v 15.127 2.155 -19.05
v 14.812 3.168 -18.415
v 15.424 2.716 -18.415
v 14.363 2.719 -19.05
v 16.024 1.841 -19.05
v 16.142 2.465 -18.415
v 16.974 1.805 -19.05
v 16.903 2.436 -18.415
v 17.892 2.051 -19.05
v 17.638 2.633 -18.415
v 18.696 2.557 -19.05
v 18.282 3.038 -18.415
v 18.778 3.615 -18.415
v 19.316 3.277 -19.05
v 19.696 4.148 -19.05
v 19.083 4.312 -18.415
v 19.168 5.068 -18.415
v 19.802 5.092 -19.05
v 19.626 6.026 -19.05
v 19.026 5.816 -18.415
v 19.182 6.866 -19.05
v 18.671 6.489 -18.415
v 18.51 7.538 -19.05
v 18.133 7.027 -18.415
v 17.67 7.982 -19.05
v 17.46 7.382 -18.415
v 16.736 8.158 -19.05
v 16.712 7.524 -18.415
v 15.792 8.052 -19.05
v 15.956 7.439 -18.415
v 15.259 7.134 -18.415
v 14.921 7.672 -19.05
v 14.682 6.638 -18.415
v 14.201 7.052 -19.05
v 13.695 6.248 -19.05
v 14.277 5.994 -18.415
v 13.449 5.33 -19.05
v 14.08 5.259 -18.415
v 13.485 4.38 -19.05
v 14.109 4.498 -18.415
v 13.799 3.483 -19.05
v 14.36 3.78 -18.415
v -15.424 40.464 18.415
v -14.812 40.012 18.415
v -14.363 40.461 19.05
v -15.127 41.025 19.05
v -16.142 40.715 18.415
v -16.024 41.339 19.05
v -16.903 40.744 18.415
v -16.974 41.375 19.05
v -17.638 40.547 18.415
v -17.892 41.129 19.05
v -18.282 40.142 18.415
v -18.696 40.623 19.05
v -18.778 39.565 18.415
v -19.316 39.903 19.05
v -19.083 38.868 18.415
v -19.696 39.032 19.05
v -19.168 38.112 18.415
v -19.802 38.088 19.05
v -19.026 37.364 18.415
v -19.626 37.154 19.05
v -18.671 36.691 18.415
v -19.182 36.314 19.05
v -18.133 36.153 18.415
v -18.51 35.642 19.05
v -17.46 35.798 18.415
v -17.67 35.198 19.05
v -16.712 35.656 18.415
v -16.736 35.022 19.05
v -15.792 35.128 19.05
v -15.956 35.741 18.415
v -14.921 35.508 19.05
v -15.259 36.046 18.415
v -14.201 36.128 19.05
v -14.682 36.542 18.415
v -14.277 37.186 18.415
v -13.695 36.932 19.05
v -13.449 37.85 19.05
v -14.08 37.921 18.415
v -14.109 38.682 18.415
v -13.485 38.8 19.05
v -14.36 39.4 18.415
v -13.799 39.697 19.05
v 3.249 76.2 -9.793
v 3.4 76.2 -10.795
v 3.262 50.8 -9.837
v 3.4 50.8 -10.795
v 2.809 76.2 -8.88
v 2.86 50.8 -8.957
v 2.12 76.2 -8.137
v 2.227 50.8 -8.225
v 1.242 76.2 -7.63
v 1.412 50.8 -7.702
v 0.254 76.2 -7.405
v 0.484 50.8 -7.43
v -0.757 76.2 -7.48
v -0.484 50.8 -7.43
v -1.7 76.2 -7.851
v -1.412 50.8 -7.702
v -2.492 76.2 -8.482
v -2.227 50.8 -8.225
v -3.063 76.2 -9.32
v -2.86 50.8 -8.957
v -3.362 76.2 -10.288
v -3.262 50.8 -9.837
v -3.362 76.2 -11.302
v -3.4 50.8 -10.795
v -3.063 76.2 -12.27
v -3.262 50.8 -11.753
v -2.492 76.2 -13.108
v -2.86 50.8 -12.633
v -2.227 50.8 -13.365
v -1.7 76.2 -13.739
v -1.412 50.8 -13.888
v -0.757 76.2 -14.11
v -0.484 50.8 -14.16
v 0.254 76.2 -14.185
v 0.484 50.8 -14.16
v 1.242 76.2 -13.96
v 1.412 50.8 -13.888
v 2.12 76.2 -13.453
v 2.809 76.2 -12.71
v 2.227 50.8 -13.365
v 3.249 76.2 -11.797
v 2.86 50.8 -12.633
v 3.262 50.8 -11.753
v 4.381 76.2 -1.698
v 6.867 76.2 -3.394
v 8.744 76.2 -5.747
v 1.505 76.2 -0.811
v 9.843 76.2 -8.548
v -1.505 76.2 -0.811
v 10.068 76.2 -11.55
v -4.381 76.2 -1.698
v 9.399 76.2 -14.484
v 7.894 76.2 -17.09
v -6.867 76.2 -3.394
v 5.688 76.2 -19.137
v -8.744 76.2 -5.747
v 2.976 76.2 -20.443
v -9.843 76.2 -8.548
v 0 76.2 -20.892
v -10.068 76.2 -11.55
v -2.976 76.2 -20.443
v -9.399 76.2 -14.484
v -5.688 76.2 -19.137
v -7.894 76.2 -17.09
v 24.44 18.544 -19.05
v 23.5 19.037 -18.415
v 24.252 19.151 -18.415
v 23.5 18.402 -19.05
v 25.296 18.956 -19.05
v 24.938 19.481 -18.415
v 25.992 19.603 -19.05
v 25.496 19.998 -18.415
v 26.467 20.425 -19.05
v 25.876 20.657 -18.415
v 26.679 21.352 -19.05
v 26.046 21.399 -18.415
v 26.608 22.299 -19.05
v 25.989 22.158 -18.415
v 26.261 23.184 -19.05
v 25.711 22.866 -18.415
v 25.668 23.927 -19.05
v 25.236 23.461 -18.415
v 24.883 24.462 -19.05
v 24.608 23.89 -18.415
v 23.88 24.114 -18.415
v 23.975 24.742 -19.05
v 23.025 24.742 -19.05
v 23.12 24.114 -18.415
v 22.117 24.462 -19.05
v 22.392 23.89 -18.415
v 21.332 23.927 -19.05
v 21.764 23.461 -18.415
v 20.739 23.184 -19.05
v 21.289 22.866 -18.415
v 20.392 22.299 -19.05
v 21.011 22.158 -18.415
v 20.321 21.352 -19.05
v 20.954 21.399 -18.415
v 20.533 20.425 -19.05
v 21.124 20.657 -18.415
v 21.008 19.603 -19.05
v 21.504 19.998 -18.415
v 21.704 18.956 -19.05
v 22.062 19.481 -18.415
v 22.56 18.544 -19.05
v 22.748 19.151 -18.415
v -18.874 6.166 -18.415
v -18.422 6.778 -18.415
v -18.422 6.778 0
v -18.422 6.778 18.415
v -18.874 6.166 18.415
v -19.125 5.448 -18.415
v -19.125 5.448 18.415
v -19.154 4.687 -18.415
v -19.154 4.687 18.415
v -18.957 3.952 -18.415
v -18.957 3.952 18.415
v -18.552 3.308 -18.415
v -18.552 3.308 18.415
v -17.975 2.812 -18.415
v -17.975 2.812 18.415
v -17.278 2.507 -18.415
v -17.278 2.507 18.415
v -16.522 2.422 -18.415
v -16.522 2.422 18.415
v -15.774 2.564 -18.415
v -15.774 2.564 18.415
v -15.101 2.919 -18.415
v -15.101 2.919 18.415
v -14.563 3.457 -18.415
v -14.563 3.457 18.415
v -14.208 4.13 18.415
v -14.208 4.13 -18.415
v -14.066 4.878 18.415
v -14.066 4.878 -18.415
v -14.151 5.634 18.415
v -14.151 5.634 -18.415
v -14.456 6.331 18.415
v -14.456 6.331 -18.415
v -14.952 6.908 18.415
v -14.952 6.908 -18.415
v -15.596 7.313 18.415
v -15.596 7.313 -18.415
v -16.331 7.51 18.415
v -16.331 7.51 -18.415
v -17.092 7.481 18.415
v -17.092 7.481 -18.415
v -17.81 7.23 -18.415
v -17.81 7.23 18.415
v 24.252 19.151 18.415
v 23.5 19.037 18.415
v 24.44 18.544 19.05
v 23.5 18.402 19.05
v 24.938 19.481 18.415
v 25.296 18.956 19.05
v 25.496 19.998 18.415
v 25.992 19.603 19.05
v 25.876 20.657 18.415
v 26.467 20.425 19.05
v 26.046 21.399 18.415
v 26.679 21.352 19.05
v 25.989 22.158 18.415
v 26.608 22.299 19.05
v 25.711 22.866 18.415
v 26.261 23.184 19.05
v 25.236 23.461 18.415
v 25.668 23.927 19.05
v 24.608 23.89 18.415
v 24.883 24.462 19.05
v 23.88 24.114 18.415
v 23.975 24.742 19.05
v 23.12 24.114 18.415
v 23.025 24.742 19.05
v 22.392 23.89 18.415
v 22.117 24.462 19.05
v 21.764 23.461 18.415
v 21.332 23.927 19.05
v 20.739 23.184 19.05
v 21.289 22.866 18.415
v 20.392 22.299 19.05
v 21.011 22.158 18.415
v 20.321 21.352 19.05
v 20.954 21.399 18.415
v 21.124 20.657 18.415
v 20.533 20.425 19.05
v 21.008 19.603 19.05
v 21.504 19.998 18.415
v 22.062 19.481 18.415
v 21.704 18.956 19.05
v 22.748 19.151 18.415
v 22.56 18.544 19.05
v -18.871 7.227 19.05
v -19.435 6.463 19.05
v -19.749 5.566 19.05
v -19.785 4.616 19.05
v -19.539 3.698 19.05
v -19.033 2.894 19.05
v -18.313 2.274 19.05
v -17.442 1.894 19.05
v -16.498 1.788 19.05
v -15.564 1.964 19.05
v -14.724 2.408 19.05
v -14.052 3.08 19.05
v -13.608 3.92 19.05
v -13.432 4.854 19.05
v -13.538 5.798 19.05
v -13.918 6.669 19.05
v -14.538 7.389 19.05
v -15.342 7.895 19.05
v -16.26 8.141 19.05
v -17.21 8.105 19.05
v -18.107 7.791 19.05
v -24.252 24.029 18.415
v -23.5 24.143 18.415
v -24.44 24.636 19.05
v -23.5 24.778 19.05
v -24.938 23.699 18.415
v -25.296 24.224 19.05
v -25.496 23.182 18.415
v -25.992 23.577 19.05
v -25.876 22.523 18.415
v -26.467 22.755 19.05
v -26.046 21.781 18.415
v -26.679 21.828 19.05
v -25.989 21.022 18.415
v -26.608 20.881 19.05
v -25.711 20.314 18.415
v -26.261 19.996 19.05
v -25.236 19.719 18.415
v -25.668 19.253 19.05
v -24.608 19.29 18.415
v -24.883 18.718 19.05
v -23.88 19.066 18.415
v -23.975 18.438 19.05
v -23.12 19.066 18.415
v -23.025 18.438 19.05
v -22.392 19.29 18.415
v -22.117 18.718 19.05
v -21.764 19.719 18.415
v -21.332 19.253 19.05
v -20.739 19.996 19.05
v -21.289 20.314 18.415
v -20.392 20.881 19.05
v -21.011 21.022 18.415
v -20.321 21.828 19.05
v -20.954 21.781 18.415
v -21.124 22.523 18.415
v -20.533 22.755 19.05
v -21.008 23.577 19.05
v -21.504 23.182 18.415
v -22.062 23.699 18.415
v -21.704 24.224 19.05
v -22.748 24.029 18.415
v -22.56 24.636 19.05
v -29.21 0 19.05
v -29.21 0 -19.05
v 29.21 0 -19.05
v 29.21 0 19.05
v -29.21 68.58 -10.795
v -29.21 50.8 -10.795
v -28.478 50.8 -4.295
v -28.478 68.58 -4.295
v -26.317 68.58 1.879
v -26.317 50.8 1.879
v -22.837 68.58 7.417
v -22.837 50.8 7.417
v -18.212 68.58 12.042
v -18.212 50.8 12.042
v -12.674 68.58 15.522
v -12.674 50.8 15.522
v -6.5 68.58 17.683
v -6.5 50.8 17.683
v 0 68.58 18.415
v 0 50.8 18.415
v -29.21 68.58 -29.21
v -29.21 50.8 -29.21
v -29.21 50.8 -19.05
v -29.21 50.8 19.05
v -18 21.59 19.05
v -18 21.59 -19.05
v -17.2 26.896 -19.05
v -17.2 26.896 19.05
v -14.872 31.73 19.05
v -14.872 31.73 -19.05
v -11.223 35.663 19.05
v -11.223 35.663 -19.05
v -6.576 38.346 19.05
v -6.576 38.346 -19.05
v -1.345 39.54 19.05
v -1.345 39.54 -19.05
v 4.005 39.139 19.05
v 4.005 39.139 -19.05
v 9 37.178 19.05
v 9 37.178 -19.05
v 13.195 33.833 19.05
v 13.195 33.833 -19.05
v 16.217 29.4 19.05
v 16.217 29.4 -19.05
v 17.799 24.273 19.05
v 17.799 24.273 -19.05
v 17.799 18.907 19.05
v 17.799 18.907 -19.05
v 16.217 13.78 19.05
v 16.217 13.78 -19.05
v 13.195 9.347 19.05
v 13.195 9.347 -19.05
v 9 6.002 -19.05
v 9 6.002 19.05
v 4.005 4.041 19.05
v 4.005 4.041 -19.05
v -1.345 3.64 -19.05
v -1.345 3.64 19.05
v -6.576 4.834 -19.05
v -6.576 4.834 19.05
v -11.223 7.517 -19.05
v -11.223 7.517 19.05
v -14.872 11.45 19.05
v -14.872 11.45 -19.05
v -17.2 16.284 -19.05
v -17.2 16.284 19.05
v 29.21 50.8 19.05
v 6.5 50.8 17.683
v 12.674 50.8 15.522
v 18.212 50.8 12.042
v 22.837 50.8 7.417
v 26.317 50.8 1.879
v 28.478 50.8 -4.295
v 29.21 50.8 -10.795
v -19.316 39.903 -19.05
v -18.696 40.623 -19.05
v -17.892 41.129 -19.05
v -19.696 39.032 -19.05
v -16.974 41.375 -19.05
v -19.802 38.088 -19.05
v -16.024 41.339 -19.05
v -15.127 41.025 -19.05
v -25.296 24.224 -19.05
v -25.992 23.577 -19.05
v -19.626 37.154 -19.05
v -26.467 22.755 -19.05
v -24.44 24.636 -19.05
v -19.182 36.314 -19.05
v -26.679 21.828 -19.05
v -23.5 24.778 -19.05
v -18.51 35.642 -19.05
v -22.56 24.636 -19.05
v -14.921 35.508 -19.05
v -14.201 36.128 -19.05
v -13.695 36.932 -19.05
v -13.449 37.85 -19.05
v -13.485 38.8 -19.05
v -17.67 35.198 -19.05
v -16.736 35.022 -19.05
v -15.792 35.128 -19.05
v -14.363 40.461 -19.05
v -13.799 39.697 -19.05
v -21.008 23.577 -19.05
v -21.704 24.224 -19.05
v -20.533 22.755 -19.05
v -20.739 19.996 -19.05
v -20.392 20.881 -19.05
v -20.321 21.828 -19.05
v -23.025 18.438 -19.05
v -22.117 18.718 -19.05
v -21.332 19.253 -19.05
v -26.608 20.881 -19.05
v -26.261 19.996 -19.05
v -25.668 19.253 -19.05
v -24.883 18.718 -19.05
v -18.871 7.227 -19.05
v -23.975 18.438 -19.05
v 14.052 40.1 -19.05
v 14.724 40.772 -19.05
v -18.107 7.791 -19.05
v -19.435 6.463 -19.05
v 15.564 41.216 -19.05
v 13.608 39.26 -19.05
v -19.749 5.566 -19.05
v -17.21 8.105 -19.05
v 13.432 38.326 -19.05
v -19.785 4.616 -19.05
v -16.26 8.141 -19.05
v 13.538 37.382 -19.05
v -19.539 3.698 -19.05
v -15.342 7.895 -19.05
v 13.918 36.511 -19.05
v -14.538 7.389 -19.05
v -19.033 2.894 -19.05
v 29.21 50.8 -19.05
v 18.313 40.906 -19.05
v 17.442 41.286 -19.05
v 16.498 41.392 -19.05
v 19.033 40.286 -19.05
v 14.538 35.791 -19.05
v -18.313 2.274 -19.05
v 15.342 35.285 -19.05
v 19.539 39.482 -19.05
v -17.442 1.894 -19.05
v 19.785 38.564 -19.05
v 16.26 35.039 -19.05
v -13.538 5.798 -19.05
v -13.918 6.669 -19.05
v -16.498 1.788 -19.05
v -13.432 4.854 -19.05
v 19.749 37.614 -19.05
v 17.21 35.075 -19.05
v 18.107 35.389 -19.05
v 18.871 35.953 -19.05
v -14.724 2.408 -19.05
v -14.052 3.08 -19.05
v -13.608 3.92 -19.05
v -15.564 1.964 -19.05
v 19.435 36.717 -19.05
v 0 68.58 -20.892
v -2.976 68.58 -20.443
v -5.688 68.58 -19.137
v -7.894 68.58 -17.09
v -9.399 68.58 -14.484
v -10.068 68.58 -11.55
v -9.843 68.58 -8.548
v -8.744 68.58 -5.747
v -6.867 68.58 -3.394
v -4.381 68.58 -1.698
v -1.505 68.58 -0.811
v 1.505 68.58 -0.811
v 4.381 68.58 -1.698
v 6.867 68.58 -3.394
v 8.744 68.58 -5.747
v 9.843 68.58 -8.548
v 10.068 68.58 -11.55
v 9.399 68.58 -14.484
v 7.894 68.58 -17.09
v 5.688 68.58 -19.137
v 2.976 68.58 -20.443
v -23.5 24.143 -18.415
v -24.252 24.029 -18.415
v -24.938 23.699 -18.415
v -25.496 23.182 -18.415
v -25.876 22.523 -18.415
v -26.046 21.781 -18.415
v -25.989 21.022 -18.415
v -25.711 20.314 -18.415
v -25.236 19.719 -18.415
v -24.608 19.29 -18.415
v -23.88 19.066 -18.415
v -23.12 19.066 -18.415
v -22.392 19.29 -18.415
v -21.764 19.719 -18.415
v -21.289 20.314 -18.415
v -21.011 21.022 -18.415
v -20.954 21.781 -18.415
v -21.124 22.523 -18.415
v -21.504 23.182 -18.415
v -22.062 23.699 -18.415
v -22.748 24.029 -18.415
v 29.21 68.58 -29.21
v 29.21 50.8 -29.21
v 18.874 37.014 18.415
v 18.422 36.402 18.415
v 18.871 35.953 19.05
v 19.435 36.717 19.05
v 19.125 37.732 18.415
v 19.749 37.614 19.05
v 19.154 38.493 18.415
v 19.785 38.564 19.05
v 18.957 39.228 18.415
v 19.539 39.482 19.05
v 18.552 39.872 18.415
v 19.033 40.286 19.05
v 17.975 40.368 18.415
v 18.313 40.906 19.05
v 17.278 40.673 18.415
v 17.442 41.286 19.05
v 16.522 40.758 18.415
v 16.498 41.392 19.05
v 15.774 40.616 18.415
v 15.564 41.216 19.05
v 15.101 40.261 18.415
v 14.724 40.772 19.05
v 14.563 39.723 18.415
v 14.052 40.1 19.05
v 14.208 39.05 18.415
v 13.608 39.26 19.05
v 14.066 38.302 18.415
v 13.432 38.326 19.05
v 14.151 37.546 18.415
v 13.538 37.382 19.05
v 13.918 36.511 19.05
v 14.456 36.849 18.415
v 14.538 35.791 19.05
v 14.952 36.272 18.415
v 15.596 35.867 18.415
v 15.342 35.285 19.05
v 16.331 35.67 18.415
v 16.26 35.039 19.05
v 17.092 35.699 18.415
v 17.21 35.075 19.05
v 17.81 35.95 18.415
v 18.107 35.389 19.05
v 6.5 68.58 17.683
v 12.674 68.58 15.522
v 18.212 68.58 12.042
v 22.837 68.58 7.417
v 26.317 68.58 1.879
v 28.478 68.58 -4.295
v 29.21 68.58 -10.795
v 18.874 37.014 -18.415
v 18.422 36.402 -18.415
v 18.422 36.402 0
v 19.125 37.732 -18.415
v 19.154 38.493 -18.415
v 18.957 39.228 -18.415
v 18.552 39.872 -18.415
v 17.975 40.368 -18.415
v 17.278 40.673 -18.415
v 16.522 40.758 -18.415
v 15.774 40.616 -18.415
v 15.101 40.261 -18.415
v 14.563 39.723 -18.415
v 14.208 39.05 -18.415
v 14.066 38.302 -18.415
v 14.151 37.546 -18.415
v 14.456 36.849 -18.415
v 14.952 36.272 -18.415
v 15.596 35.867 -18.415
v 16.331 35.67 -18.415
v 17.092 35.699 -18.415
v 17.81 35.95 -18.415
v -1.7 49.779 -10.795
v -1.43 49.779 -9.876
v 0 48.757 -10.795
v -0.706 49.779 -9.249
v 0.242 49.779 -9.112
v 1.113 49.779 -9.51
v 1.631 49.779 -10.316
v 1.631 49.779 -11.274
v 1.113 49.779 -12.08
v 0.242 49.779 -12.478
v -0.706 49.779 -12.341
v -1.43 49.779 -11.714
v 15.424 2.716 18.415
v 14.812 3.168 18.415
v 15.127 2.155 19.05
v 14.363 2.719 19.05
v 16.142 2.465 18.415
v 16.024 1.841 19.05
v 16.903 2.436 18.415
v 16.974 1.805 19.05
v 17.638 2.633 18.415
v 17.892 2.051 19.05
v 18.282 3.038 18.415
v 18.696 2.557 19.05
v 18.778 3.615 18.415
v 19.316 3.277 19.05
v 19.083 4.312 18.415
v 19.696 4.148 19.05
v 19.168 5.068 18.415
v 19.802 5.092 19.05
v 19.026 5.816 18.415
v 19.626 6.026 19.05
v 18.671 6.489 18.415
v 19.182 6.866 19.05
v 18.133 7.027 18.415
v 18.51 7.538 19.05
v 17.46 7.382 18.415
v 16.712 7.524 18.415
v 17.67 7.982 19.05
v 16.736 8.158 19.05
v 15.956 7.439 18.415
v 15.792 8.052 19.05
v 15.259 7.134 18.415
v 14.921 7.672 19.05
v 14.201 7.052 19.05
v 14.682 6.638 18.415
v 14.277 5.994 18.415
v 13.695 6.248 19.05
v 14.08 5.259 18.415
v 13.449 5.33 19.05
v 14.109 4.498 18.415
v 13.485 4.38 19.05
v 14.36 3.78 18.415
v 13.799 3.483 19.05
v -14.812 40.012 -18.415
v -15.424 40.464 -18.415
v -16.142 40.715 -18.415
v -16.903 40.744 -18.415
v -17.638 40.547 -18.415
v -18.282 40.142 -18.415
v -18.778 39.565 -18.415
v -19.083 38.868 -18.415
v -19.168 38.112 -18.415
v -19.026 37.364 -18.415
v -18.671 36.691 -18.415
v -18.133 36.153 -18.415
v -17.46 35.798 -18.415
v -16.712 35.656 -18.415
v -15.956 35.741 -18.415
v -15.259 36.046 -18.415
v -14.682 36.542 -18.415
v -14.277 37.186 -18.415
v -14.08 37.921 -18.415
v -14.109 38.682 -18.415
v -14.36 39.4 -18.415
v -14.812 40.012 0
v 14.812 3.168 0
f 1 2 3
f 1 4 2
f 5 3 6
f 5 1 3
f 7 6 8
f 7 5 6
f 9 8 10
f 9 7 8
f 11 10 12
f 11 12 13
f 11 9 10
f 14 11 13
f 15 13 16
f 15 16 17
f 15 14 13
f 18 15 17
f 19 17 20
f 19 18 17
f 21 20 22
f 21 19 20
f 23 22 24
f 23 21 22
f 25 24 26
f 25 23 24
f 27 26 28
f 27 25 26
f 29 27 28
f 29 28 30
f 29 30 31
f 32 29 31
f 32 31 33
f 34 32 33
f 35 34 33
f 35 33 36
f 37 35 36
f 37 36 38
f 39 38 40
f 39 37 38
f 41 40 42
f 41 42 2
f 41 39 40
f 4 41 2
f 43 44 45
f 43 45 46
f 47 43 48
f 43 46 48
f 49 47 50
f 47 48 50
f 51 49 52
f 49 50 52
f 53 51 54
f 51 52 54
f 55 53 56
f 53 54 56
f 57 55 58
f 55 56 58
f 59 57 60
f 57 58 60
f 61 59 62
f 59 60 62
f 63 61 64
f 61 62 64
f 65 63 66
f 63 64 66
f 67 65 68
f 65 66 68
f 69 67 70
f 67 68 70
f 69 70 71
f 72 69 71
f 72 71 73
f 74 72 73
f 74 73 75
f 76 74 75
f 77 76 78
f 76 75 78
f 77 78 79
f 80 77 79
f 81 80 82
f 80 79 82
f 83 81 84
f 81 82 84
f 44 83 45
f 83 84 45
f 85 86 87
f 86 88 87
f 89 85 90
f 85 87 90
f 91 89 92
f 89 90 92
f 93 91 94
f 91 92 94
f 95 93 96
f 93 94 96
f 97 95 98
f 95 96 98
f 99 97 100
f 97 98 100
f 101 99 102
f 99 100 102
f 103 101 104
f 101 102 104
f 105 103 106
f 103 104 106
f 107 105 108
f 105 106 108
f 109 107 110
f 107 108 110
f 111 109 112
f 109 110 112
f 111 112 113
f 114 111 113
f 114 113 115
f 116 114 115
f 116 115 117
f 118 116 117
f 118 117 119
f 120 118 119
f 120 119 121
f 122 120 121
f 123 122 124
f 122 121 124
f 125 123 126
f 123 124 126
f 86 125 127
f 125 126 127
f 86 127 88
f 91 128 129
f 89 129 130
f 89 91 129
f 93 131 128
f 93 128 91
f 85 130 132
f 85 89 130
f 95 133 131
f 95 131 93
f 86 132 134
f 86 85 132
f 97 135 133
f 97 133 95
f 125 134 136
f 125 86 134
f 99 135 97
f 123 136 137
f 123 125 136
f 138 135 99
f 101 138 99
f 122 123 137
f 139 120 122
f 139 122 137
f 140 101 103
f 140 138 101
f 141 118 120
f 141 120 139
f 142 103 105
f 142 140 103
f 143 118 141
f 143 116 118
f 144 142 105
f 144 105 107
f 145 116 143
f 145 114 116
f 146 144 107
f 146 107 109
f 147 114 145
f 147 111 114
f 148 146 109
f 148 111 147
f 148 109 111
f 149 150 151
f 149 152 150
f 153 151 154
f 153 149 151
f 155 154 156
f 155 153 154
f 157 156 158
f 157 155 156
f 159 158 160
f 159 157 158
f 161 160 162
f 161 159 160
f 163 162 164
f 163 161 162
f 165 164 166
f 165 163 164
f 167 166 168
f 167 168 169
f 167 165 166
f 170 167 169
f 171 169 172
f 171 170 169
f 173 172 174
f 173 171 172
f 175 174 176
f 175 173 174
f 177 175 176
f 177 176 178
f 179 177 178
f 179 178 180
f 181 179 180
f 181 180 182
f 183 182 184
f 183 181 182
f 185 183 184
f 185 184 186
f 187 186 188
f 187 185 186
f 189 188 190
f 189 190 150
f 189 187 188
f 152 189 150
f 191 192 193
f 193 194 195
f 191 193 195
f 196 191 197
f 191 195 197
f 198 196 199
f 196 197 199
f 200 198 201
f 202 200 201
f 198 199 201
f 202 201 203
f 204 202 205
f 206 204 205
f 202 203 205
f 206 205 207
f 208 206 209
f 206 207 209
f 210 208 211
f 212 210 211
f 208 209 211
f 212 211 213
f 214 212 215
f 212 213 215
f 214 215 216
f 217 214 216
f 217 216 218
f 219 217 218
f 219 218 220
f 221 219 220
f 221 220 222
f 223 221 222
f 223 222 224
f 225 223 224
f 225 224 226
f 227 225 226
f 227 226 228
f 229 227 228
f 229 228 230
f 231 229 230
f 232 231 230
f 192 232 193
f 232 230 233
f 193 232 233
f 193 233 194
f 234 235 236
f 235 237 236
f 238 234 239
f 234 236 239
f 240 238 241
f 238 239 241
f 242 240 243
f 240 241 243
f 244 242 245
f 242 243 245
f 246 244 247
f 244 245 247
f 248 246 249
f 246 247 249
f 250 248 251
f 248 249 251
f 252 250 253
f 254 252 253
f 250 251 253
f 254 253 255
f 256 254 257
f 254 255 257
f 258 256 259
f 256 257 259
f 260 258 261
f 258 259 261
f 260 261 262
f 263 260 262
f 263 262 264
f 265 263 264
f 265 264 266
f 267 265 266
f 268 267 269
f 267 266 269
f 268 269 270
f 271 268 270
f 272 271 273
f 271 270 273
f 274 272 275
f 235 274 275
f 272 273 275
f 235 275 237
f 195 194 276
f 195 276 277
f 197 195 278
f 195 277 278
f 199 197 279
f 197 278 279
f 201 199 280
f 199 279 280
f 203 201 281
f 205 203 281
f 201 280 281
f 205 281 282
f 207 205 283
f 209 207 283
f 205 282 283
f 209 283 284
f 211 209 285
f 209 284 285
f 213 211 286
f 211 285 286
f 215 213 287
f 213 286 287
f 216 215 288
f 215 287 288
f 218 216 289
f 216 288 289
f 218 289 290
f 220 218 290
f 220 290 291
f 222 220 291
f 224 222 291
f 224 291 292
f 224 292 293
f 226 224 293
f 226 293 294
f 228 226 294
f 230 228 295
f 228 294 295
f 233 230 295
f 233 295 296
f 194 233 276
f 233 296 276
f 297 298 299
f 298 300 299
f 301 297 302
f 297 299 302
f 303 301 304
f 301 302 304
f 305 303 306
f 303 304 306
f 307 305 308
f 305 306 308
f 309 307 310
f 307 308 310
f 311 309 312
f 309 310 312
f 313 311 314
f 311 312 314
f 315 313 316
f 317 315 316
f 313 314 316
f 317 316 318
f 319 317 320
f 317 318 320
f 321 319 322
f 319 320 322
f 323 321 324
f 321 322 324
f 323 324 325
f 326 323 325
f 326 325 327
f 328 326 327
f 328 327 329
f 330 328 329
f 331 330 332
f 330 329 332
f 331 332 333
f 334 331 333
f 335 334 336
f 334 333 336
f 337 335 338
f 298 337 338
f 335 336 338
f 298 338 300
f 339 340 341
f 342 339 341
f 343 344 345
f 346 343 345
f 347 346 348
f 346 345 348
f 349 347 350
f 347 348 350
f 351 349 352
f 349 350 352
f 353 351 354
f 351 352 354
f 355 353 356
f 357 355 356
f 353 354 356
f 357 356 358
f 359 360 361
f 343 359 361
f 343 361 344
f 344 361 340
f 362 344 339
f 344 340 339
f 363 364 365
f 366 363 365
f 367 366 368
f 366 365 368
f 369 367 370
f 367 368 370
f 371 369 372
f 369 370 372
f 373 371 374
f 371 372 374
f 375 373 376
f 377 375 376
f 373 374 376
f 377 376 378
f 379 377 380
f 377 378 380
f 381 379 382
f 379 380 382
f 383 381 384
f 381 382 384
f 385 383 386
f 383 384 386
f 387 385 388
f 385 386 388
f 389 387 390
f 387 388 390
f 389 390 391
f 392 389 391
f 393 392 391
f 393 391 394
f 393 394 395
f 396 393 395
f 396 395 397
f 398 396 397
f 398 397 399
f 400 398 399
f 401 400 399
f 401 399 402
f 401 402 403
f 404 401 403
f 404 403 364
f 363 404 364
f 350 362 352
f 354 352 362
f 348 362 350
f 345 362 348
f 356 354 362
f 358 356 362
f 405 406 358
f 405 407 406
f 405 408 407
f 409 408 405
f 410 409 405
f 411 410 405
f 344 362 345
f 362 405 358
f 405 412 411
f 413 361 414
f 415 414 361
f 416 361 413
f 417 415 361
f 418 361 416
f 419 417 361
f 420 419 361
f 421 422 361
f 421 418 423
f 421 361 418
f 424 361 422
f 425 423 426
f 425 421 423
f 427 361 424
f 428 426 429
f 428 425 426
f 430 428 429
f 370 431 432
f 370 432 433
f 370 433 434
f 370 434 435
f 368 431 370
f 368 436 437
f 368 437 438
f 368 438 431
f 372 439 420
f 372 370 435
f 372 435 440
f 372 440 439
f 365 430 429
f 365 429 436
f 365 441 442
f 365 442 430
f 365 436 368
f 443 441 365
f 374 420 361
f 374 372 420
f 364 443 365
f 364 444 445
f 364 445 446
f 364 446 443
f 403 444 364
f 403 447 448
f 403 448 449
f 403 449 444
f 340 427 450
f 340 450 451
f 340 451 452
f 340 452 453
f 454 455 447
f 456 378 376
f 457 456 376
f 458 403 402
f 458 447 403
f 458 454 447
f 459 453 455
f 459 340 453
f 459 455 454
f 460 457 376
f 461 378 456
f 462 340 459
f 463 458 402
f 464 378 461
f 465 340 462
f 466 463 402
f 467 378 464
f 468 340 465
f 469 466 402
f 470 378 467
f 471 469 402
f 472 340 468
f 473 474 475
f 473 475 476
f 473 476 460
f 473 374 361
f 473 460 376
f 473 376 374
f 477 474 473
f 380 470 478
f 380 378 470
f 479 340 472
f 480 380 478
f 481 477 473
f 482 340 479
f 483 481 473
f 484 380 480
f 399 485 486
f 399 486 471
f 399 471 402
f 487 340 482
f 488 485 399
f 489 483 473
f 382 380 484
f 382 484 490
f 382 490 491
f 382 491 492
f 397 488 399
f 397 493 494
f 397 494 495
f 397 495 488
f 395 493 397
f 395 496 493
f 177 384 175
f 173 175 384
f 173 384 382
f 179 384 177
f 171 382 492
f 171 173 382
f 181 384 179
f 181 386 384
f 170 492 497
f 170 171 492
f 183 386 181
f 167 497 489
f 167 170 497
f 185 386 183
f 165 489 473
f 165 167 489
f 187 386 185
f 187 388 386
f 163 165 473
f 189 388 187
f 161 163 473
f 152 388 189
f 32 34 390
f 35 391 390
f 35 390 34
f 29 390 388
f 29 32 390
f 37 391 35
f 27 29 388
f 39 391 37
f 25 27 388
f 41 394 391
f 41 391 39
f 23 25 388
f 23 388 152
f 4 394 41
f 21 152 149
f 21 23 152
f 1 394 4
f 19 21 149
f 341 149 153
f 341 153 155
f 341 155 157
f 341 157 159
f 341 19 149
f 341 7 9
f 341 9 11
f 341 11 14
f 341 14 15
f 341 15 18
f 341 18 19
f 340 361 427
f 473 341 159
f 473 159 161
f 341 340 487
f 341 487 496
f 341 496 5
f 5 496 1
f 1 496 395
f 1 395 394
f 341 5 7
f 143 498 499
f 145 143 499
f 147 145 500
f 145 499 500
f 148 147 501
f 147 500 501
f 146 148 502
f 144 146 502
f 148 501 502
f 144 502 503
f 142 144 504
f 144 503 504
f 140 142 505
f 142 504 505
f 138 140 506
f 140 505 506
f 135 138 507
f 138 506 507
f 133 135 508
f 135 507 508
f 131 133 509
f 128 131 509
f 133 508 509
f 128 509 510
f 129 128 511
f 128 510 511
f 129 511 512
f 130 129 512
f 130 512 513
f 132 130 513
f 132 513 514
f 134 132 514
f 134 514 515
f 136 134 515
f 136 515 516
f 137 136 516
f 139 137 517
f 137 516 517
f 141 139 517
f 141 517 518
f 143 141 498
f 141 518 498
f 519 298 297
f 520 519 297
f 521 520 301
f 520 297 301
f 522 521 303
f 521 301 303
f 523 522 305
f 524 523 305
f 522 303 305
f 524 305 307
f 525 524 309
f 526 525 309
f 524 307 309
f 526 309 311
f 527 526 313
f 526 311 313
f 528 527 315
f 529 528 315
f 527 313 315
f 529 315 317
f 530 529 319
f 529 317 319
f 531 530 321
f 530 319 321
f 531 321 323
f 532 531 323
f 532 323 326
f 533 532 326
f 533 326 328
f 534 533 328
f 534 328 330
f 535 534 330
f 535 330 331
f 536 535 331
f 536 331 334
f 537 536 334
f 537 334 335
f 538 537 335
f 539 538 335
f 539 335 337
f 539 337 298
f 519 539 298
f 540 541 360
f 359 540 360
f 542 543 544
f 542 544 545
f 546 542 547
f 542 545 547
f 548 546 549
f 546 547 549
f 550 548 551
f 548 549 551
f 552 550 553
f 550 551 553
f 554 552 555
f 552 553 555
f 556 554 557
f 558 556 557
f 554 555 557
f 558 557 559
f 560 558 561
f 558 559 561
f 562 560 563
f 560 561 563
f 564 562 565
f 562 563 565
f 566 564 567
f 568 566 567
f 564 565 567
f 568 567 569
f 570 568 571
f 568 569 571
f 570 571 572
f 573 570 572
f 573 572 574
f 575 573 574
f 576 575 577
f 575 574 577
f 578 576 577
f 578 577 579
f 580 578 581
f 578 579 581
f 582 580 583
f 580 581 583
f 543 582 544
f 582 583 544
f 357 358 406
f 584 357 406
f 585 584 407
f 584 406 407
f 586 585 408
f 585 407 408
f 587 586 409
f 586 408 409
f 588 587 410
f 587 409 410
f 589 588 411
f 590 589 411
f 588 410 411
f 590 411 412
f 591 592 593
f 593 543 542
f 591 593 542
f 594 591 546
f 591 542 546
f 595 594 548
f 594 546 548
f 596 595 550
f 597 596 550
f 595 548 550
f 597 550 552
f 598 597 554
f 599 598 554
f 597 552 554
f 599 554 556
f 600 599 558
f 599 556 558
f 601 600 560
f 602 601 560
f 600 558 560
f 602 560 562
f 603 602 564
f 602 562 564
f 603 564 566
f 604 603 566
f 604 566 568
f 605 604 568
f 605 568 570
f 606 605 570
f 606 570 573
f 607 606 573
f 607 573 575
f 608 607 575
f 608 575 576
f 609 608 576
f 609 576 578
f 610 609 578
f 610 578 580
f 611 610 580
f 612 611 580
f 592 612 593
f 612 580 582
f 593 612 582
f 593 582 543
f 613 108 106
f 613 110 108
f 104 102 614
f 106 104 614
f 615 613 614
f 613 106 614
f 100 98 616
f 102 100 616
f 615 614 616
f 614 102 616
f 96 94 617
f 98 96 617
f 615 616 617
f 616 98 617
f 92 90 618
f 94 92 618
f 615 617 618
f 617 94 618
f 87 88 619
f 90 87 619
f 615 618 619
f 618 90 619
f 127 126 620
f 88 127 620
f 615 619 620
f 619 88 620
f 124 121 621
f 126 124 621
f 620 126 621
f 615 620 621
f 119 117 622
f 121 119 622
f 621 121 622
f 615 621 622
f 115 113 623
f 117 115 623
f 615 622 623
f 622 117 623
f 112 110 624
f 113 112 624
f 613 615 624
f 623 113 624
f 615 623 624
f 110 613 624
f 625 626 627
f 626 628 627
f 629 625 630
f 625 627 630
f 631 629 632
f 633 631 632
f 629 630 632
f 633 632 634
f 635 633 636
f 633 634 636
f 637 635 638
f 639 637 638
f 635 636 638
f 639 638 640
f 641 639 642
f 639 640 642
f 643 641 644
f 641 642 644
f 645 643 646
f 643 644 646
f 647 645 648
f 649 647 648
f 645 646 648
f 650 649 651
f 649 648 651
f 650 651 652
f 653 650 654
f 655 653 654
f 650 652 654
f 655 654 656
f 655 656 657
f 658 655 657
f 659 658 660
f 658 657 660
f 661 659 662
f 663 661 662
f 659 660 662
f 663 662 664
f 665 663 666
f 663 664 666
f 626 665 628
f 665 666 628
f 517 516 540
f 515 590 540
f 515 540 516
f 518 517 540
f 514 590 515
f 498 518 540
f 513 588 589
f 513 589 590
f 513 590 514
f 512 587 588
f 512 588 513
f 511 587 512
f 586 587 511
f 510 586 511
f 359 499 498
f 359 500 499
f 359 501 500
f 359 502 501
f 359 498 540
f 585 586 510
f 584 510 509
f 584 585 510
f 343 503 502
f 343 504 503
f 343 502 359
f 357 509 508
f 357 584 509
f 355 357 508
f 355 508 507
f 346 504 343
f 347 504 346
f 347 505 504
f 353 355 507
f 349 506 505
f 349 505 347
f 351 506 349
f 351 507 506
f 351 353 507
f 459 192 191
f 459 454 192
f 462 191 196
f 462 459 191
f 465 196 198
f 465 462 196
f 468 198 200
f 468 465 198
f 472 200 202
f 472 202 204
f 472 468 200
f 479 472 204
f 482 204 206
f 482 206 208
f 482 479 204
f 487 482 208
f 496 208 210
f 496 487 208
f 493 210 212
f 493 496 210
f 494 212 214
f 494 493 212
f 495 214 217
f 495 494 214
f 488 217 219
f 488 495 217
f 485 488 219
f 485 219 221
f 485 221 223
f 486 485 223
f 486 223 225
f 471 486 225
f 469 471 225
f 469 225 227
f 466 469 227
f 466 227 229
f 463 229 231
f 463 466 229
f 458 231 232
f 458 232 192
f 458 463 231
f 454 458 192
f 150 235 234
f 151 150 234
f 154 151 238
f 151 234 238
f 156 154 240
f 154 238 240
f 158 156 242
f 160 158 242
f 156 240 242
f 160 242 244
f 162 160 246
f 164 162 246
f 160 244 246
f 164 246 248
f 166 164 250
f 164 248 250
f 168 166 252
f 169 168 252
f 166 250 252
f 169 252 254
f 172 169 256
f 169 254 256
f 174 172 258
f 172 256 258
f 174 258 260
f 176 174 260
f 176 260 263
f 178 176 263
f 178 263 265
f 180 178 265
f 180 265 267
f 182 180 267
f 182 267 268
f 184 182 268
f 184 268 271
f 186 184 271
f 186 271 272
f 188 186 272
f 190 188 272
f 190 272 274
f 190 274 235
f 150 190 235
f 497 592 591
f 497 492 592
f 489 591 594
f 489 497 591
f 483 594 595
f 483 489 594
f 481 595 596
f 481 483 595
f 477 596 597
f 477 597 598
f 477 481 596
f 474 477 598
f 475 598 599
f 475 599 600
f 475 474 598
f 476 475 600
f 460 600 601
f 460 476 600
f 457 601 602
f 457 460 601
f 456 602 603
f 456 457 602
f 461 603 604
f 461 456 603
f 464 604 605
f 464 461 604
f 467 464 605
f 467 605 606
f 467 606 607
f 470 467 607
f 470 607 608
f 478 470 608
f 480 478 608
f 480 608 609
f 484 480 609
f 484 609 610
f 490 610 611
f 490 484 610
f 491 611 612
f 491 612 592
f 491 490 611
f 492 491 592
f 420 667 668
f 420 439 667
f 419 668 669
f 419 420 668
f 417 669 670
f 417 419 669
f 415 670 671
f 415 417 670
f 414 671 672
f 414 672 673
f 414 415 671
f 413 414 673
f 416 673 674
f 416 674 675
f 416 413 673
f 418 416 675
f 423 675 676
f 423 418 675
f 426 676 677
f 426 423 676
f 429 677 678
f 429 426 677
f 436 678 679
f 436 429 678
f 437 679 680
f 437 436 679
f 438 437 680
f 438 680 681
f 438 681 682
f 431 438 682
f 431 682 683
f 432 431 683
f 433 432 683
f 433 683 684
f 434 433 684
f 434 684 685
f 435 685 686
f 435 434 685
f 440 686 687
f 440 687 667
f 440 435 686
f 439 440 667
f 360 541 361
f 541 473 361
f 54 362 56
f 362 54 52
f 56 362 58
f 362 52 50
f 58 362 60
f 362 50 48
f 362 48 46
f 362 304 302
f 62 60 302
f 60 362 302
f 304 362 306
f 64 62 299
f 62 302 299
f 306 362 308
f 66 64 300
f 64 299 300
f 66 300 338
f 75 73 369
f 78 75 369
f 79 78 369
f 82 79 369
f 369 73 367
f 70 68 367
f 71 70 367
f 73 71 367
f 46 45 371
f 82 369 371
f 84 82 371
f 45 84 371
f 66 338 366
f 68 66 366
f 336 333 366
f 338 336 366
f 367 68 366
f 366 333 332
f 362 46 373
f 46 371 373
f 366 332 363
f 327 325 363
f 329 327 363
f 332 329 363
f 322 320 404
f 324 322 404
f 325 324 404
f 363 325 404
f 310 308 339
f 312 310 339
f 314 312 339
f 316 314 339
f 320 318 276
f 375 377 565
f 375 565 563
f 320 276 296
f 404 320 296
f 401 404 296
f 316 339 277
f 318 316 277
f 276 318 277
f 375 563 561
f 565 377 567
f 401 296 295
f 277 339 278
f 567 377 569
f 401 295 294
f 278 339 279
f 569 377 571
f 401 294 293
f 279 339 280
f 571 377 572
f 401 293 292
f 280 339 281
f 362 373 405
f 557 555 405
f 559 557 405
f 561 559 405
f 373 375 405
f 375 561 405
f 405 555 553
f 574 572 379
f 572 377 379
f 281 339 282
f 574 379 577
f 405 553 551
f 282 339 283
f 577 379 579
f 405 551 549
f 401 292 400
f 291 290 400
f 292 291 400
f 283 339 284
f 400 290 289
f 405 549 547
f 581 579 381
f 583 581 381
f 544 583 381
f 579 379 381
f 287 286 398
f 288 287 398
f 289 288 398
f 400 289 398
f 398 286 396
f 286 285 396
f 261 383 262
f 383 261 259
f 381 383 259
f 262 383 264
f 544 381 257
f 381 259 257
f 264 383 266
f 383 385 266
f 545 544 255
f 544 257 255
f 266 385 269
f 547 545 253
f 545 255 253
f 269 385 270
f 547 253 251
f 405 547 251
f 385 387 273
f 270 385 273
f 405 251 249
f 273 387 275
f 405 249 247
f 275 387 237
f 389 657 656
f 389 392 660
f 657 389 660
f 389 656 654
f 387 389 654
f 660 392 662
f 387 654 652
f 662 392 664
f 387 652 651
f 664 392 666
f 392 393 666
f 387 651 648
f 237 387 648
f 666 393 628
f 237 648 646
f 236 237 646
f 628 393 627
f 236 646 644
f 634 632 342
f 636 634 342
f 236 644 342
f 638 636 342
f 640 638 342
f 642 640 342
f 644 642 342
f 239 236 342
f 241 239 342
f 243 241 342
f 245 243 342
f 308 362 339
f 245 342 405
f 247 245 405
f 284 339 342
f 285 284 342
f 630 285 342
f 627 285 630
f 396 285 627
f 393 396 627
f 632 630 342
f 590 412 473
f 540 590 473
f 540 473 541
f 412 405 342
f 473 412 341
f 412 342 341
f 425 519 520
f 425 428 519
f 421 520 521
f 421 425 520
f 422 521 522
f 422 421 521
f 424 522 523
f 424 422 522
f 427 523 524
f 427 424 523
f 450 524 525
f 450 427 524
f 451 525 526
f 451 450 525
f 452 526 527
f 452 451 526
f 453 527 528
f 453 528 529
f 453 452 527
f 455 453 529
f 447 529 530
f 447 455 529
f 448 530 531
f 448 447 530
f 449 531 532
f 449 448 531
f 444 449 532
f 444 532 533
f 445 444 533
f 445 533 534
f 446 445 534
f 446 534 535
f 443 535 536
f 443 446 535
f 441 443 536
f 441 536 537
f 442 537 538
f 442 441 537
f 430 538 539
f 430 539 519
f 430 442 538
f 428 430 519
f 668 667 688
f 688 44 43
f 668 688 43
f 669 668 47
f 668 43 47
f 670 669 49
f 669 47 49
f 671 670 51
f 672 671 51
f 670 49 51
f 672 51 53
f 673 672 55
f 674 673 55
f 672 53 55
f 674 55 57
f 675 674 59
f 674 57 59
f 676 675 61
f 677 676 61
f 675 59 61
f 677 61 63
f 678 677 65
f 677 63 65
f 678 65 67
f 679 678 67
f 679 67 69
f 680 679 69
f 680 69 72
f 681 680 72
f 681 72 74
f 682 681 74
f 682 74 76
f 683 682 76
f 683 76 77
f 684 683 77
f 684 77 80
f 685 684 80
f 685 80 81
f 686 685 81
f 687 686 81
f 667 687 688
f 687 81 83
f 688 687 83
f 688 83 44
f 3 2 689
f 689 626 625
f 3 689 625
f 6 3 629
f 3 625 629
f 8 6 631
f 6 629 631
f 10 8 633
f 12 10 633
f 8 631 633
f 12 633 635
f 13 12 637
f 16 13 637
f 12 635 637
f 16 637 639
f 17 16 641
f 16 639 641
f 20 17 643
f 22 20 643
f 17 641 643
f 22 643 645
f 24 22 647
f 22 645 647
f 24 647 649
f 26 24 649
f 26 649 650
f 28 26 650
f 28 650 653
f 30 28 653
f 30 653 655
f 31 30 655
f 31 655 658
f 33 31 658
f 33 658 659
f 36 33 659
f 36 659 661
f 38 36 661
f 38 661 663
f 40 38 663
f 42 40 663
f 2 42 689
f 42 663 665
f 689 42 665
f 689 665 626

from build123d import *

# Parameters (mm, degrees)
SKETCH1_W                  = 58.42
SKETCH1_H                  = 38.1
BOSS_EXTRUDE1_DEPTH        = 50.8
BOSS_EXTRUDE3_DEPTH        = 17.78
SKETCH3_R                  = 10.0965
BOSS_EXTRUDE4_DEPTH        = 7.62
SKETCH8_R                  = 18
CUT_EXTRUDE2_DEPTH         = 91.06261211
M8X1_25_TAPPED_HOLE1_D     = 6.8
M8X1_25_TAPPED_HOLE1_DEPTH = 25.4
M8X1_25_TAPPED_HOLE1_TIP   = 2.042926105
CIRPATTERN2_COUNT          = 8


with BuildPart() as part:
    # Sketch1 → Boss-Extrude1 (new body)
    with BuildSketch(Plane(origin=(0, 0, 0), x_dir=(1, 0, 0), z_dir=(0, 1, 0))):
        Rectangle(SKETCH1_W, SKETCH1_H)
    extrude(amount=BOSS_EXTRUDE1_DEPTH)

    # Sketch2 → Boss-Extrude3 (add)
    with BuildSketch(Plane(origin=(0, 50.8, 0), x_dir=(-1, 0, 0), z_dir=(0, 1, 0))):
        with BuildLine():
            Line((29.21, -29.21), (29.21, -10.795))
            ThreePointArc((29.21, -10.795), (20.654589078, 9.859589078), (0, 18.415))
            ThreePointArc((0, 18.415), (-20.654589078, 9.859589078), (-29.21, -10.795))
            Line((-29.21, -10.795), (-29.21, -29.21))
            Line((-29.21, -29.21), (29.21, -29.21))
        make_face()
    extrude(amount=BOSS_EXTRUDE3_DEPTH)

    # Sketch3 → Boss-Extrude4 (add)
    with BuildSketch(Plane(origin=(0, 68.58, 0), x_dir=(-1, 0, 0), z_dir=(0, 1, 0))):
        with Locations(Location((0, -10.795, 0), (0, 0, 270))):
            Circle(SKETCH3_R)
    extrude(amount=BOSS_EXTRUDE4_DEPTH)

    # Sketch8 → Cut-Extrude2 (cut, through all)
    with BuildSketch(Plane(origin=(0, 0, -19.05), x_dir=(-1, 0, 0), z_dir=(0, 0, -1))):
        with Locations((0, 21.59)):
            Circle(SKETCH8_R)
    extrude(amount=-CUT_EXTRUDE2_DEPTH, mode=Mode.SUBTRACT)

    # M8x1.25 Tapped Hole1
    with Locations(Plane(origin=(0, 76.2, 0), x_dir=(-1, 0, 0), z_dir=(0, 1, 0))):
        with Locations((0, -10.795)):
            Hole(M8X1_25_TAPPED_HOLE1_D / 2, depth=M8X1_25_TAPPED_HOLE1_DEPTH)
            with Locations((0, 0, -(M8X1_25_TAPPED_HOLE1_DEPTH + M8X1_25_TAPPED_HOLE1_TIP / 2))):  # 118° drill point
                Cone(0, M8X1_25_TAPPED_HOLE1_D / 2, M8X1_25_TAPPED_HOLE1_TIP, mode=Mode.SUBTRACT)

    # Sketch13 → 1/4-20 Tapped Hole1 (revolve, cut)
    with BuildSketch(Plane(origin=(-23.5, 21.59, -19.05), x_dir=(0, 1, 0), z_dir=(1, 0, 0))):
        Polygon((0, 0), (0, 20.583816902), (2.5527, 19.05), (2.5527, 0.635), (3.1877, 0), align=None)
    f_1_4_20_tapped_hole1 = revolve(axis=Axis((-23.5, 21.59, -25.4), (0, 0, 1)), mode=Mode.SUBTRACT)

    # CirPattern2: 1/4-20 Tapped Hole1 ×8 about axis, 2 skipped
    cirpattern2_axis = Axis((0, 21.59, 0), (0, 0, -1))
    add([f_1_4_20_tapped_hole1.rotate(cirpattern2_axis, i * 360 / CIRPATTERN2_COUNT) for i in range(1, CIRPATTERN2_COUNT) if i not in (2, 6)], mode=Mode.SUBTRACT)

    # Mirror2: 1/4-20 Tapped Hole1 across plane
    add(f_1_4_20_tapped_hole1.mirror(Plane.XY), mode=Mode.SUBTRACT)

    # Mirror2 copy 1 sketch → Mirror2 copy 1 (revolve, cut)
    with BuildSketch(Plane(origin=(-16.617009358, 38.207009358, 19.05), x_dir=(0.7071067811865475, 0.7071067811865476, 0), z_dir=(0.7071067811865476, -0.7071067811865475, 0))):
        Polygon((0, 0), (0, -20.583816902), (2.5527, -19.05), (2.5527, -0.635), (3.1877, 0), align=None)
    revolve(axis=Axis((-16.617009358, 38.207009358, 25.4), (0, 0, 1)), mode=Mode.SUBTRACT)

    # Mirror2 copy 2 sketch → Mirror2 copy 2 (revolve, cut)
    with BuildSketch(Plane(origin=(16.617009358, 38.207009358, 19.05), x_dir=(0.7071067811865476, -0.7071067811865475, 0), z_dir=(-0.7071067811865475, -0.7071067811865476, 0))):
        Polygon((0, 0), (0, -20.583816902), (2.5527, -19.05), (2.5527, -0.635), (3.1877, 0), align=None)
    revolve(axis=Axis((16.617009358, 38.207009358, 25.4), (0, 0, 1)), mode=Mode.SUBTRACT)

    # Mirror2 copy 3 sketch → Mirror2 copy 3 (revolve, cut)
    with BuildSketch(Plane(origin=(23.5, 21.59, 19.05), x_dir=(0, -1, 0), z_dir=(-1, 0, 0))):
        Polygon((0, 0), (0, -20.583816902), (2.5527, -19.05), (2.5527, -0.635), (3.1877, 0), align=None)
    revolve(axis=Axis((23.5, 21.59, 25.4), (0, 0, 1)), mode=Mode.SUBTRACT)

    # Mirror2 copy 4 sketch → Mirror2 copy 4 (revolve, cut)
    with BuildSketch(Plane(origin=(16.617009358, 4.972990642, 19.05), x_dir=(-0.7071067811865475, -0.7071067811865477, 0), z_dir=(-0.7071067811865477, 0.7071067811865475, 0))):
        Polygon((0, 0), (0, -20.583816902), (2.5527, -19.05), (2.5527, -0.635), (3.1877, 0), align=None)
    revolve(axis=Axis((16.617009358, 4.972990642, 25.4), (0, 0, 1)), mode=Mode.SUBTRACT)

    # Mirror2 copy 5 sketch → Mirror2 copy 5 (revolve, cut)
    with BuildSketch(Plane(origin=(-16.617009358, 4.972990642, 19.05), x_dir=(-0.7071067811865477, 0.7071067811865474, 0), z_dir=(0.7071067811865474, 0.7071067811865477, 0))):
        Polygon((0, 0), (0, -20.583816902), (2.5527, -19.05), (2.5527, -0.635), (3.1877, 0), align=None)
    revolve(axis=Axis((-16.617009358, 4.972990642, 25.4), (0, 0, 1)), mode=Mode.SUBTRACT)


solid = part.part
